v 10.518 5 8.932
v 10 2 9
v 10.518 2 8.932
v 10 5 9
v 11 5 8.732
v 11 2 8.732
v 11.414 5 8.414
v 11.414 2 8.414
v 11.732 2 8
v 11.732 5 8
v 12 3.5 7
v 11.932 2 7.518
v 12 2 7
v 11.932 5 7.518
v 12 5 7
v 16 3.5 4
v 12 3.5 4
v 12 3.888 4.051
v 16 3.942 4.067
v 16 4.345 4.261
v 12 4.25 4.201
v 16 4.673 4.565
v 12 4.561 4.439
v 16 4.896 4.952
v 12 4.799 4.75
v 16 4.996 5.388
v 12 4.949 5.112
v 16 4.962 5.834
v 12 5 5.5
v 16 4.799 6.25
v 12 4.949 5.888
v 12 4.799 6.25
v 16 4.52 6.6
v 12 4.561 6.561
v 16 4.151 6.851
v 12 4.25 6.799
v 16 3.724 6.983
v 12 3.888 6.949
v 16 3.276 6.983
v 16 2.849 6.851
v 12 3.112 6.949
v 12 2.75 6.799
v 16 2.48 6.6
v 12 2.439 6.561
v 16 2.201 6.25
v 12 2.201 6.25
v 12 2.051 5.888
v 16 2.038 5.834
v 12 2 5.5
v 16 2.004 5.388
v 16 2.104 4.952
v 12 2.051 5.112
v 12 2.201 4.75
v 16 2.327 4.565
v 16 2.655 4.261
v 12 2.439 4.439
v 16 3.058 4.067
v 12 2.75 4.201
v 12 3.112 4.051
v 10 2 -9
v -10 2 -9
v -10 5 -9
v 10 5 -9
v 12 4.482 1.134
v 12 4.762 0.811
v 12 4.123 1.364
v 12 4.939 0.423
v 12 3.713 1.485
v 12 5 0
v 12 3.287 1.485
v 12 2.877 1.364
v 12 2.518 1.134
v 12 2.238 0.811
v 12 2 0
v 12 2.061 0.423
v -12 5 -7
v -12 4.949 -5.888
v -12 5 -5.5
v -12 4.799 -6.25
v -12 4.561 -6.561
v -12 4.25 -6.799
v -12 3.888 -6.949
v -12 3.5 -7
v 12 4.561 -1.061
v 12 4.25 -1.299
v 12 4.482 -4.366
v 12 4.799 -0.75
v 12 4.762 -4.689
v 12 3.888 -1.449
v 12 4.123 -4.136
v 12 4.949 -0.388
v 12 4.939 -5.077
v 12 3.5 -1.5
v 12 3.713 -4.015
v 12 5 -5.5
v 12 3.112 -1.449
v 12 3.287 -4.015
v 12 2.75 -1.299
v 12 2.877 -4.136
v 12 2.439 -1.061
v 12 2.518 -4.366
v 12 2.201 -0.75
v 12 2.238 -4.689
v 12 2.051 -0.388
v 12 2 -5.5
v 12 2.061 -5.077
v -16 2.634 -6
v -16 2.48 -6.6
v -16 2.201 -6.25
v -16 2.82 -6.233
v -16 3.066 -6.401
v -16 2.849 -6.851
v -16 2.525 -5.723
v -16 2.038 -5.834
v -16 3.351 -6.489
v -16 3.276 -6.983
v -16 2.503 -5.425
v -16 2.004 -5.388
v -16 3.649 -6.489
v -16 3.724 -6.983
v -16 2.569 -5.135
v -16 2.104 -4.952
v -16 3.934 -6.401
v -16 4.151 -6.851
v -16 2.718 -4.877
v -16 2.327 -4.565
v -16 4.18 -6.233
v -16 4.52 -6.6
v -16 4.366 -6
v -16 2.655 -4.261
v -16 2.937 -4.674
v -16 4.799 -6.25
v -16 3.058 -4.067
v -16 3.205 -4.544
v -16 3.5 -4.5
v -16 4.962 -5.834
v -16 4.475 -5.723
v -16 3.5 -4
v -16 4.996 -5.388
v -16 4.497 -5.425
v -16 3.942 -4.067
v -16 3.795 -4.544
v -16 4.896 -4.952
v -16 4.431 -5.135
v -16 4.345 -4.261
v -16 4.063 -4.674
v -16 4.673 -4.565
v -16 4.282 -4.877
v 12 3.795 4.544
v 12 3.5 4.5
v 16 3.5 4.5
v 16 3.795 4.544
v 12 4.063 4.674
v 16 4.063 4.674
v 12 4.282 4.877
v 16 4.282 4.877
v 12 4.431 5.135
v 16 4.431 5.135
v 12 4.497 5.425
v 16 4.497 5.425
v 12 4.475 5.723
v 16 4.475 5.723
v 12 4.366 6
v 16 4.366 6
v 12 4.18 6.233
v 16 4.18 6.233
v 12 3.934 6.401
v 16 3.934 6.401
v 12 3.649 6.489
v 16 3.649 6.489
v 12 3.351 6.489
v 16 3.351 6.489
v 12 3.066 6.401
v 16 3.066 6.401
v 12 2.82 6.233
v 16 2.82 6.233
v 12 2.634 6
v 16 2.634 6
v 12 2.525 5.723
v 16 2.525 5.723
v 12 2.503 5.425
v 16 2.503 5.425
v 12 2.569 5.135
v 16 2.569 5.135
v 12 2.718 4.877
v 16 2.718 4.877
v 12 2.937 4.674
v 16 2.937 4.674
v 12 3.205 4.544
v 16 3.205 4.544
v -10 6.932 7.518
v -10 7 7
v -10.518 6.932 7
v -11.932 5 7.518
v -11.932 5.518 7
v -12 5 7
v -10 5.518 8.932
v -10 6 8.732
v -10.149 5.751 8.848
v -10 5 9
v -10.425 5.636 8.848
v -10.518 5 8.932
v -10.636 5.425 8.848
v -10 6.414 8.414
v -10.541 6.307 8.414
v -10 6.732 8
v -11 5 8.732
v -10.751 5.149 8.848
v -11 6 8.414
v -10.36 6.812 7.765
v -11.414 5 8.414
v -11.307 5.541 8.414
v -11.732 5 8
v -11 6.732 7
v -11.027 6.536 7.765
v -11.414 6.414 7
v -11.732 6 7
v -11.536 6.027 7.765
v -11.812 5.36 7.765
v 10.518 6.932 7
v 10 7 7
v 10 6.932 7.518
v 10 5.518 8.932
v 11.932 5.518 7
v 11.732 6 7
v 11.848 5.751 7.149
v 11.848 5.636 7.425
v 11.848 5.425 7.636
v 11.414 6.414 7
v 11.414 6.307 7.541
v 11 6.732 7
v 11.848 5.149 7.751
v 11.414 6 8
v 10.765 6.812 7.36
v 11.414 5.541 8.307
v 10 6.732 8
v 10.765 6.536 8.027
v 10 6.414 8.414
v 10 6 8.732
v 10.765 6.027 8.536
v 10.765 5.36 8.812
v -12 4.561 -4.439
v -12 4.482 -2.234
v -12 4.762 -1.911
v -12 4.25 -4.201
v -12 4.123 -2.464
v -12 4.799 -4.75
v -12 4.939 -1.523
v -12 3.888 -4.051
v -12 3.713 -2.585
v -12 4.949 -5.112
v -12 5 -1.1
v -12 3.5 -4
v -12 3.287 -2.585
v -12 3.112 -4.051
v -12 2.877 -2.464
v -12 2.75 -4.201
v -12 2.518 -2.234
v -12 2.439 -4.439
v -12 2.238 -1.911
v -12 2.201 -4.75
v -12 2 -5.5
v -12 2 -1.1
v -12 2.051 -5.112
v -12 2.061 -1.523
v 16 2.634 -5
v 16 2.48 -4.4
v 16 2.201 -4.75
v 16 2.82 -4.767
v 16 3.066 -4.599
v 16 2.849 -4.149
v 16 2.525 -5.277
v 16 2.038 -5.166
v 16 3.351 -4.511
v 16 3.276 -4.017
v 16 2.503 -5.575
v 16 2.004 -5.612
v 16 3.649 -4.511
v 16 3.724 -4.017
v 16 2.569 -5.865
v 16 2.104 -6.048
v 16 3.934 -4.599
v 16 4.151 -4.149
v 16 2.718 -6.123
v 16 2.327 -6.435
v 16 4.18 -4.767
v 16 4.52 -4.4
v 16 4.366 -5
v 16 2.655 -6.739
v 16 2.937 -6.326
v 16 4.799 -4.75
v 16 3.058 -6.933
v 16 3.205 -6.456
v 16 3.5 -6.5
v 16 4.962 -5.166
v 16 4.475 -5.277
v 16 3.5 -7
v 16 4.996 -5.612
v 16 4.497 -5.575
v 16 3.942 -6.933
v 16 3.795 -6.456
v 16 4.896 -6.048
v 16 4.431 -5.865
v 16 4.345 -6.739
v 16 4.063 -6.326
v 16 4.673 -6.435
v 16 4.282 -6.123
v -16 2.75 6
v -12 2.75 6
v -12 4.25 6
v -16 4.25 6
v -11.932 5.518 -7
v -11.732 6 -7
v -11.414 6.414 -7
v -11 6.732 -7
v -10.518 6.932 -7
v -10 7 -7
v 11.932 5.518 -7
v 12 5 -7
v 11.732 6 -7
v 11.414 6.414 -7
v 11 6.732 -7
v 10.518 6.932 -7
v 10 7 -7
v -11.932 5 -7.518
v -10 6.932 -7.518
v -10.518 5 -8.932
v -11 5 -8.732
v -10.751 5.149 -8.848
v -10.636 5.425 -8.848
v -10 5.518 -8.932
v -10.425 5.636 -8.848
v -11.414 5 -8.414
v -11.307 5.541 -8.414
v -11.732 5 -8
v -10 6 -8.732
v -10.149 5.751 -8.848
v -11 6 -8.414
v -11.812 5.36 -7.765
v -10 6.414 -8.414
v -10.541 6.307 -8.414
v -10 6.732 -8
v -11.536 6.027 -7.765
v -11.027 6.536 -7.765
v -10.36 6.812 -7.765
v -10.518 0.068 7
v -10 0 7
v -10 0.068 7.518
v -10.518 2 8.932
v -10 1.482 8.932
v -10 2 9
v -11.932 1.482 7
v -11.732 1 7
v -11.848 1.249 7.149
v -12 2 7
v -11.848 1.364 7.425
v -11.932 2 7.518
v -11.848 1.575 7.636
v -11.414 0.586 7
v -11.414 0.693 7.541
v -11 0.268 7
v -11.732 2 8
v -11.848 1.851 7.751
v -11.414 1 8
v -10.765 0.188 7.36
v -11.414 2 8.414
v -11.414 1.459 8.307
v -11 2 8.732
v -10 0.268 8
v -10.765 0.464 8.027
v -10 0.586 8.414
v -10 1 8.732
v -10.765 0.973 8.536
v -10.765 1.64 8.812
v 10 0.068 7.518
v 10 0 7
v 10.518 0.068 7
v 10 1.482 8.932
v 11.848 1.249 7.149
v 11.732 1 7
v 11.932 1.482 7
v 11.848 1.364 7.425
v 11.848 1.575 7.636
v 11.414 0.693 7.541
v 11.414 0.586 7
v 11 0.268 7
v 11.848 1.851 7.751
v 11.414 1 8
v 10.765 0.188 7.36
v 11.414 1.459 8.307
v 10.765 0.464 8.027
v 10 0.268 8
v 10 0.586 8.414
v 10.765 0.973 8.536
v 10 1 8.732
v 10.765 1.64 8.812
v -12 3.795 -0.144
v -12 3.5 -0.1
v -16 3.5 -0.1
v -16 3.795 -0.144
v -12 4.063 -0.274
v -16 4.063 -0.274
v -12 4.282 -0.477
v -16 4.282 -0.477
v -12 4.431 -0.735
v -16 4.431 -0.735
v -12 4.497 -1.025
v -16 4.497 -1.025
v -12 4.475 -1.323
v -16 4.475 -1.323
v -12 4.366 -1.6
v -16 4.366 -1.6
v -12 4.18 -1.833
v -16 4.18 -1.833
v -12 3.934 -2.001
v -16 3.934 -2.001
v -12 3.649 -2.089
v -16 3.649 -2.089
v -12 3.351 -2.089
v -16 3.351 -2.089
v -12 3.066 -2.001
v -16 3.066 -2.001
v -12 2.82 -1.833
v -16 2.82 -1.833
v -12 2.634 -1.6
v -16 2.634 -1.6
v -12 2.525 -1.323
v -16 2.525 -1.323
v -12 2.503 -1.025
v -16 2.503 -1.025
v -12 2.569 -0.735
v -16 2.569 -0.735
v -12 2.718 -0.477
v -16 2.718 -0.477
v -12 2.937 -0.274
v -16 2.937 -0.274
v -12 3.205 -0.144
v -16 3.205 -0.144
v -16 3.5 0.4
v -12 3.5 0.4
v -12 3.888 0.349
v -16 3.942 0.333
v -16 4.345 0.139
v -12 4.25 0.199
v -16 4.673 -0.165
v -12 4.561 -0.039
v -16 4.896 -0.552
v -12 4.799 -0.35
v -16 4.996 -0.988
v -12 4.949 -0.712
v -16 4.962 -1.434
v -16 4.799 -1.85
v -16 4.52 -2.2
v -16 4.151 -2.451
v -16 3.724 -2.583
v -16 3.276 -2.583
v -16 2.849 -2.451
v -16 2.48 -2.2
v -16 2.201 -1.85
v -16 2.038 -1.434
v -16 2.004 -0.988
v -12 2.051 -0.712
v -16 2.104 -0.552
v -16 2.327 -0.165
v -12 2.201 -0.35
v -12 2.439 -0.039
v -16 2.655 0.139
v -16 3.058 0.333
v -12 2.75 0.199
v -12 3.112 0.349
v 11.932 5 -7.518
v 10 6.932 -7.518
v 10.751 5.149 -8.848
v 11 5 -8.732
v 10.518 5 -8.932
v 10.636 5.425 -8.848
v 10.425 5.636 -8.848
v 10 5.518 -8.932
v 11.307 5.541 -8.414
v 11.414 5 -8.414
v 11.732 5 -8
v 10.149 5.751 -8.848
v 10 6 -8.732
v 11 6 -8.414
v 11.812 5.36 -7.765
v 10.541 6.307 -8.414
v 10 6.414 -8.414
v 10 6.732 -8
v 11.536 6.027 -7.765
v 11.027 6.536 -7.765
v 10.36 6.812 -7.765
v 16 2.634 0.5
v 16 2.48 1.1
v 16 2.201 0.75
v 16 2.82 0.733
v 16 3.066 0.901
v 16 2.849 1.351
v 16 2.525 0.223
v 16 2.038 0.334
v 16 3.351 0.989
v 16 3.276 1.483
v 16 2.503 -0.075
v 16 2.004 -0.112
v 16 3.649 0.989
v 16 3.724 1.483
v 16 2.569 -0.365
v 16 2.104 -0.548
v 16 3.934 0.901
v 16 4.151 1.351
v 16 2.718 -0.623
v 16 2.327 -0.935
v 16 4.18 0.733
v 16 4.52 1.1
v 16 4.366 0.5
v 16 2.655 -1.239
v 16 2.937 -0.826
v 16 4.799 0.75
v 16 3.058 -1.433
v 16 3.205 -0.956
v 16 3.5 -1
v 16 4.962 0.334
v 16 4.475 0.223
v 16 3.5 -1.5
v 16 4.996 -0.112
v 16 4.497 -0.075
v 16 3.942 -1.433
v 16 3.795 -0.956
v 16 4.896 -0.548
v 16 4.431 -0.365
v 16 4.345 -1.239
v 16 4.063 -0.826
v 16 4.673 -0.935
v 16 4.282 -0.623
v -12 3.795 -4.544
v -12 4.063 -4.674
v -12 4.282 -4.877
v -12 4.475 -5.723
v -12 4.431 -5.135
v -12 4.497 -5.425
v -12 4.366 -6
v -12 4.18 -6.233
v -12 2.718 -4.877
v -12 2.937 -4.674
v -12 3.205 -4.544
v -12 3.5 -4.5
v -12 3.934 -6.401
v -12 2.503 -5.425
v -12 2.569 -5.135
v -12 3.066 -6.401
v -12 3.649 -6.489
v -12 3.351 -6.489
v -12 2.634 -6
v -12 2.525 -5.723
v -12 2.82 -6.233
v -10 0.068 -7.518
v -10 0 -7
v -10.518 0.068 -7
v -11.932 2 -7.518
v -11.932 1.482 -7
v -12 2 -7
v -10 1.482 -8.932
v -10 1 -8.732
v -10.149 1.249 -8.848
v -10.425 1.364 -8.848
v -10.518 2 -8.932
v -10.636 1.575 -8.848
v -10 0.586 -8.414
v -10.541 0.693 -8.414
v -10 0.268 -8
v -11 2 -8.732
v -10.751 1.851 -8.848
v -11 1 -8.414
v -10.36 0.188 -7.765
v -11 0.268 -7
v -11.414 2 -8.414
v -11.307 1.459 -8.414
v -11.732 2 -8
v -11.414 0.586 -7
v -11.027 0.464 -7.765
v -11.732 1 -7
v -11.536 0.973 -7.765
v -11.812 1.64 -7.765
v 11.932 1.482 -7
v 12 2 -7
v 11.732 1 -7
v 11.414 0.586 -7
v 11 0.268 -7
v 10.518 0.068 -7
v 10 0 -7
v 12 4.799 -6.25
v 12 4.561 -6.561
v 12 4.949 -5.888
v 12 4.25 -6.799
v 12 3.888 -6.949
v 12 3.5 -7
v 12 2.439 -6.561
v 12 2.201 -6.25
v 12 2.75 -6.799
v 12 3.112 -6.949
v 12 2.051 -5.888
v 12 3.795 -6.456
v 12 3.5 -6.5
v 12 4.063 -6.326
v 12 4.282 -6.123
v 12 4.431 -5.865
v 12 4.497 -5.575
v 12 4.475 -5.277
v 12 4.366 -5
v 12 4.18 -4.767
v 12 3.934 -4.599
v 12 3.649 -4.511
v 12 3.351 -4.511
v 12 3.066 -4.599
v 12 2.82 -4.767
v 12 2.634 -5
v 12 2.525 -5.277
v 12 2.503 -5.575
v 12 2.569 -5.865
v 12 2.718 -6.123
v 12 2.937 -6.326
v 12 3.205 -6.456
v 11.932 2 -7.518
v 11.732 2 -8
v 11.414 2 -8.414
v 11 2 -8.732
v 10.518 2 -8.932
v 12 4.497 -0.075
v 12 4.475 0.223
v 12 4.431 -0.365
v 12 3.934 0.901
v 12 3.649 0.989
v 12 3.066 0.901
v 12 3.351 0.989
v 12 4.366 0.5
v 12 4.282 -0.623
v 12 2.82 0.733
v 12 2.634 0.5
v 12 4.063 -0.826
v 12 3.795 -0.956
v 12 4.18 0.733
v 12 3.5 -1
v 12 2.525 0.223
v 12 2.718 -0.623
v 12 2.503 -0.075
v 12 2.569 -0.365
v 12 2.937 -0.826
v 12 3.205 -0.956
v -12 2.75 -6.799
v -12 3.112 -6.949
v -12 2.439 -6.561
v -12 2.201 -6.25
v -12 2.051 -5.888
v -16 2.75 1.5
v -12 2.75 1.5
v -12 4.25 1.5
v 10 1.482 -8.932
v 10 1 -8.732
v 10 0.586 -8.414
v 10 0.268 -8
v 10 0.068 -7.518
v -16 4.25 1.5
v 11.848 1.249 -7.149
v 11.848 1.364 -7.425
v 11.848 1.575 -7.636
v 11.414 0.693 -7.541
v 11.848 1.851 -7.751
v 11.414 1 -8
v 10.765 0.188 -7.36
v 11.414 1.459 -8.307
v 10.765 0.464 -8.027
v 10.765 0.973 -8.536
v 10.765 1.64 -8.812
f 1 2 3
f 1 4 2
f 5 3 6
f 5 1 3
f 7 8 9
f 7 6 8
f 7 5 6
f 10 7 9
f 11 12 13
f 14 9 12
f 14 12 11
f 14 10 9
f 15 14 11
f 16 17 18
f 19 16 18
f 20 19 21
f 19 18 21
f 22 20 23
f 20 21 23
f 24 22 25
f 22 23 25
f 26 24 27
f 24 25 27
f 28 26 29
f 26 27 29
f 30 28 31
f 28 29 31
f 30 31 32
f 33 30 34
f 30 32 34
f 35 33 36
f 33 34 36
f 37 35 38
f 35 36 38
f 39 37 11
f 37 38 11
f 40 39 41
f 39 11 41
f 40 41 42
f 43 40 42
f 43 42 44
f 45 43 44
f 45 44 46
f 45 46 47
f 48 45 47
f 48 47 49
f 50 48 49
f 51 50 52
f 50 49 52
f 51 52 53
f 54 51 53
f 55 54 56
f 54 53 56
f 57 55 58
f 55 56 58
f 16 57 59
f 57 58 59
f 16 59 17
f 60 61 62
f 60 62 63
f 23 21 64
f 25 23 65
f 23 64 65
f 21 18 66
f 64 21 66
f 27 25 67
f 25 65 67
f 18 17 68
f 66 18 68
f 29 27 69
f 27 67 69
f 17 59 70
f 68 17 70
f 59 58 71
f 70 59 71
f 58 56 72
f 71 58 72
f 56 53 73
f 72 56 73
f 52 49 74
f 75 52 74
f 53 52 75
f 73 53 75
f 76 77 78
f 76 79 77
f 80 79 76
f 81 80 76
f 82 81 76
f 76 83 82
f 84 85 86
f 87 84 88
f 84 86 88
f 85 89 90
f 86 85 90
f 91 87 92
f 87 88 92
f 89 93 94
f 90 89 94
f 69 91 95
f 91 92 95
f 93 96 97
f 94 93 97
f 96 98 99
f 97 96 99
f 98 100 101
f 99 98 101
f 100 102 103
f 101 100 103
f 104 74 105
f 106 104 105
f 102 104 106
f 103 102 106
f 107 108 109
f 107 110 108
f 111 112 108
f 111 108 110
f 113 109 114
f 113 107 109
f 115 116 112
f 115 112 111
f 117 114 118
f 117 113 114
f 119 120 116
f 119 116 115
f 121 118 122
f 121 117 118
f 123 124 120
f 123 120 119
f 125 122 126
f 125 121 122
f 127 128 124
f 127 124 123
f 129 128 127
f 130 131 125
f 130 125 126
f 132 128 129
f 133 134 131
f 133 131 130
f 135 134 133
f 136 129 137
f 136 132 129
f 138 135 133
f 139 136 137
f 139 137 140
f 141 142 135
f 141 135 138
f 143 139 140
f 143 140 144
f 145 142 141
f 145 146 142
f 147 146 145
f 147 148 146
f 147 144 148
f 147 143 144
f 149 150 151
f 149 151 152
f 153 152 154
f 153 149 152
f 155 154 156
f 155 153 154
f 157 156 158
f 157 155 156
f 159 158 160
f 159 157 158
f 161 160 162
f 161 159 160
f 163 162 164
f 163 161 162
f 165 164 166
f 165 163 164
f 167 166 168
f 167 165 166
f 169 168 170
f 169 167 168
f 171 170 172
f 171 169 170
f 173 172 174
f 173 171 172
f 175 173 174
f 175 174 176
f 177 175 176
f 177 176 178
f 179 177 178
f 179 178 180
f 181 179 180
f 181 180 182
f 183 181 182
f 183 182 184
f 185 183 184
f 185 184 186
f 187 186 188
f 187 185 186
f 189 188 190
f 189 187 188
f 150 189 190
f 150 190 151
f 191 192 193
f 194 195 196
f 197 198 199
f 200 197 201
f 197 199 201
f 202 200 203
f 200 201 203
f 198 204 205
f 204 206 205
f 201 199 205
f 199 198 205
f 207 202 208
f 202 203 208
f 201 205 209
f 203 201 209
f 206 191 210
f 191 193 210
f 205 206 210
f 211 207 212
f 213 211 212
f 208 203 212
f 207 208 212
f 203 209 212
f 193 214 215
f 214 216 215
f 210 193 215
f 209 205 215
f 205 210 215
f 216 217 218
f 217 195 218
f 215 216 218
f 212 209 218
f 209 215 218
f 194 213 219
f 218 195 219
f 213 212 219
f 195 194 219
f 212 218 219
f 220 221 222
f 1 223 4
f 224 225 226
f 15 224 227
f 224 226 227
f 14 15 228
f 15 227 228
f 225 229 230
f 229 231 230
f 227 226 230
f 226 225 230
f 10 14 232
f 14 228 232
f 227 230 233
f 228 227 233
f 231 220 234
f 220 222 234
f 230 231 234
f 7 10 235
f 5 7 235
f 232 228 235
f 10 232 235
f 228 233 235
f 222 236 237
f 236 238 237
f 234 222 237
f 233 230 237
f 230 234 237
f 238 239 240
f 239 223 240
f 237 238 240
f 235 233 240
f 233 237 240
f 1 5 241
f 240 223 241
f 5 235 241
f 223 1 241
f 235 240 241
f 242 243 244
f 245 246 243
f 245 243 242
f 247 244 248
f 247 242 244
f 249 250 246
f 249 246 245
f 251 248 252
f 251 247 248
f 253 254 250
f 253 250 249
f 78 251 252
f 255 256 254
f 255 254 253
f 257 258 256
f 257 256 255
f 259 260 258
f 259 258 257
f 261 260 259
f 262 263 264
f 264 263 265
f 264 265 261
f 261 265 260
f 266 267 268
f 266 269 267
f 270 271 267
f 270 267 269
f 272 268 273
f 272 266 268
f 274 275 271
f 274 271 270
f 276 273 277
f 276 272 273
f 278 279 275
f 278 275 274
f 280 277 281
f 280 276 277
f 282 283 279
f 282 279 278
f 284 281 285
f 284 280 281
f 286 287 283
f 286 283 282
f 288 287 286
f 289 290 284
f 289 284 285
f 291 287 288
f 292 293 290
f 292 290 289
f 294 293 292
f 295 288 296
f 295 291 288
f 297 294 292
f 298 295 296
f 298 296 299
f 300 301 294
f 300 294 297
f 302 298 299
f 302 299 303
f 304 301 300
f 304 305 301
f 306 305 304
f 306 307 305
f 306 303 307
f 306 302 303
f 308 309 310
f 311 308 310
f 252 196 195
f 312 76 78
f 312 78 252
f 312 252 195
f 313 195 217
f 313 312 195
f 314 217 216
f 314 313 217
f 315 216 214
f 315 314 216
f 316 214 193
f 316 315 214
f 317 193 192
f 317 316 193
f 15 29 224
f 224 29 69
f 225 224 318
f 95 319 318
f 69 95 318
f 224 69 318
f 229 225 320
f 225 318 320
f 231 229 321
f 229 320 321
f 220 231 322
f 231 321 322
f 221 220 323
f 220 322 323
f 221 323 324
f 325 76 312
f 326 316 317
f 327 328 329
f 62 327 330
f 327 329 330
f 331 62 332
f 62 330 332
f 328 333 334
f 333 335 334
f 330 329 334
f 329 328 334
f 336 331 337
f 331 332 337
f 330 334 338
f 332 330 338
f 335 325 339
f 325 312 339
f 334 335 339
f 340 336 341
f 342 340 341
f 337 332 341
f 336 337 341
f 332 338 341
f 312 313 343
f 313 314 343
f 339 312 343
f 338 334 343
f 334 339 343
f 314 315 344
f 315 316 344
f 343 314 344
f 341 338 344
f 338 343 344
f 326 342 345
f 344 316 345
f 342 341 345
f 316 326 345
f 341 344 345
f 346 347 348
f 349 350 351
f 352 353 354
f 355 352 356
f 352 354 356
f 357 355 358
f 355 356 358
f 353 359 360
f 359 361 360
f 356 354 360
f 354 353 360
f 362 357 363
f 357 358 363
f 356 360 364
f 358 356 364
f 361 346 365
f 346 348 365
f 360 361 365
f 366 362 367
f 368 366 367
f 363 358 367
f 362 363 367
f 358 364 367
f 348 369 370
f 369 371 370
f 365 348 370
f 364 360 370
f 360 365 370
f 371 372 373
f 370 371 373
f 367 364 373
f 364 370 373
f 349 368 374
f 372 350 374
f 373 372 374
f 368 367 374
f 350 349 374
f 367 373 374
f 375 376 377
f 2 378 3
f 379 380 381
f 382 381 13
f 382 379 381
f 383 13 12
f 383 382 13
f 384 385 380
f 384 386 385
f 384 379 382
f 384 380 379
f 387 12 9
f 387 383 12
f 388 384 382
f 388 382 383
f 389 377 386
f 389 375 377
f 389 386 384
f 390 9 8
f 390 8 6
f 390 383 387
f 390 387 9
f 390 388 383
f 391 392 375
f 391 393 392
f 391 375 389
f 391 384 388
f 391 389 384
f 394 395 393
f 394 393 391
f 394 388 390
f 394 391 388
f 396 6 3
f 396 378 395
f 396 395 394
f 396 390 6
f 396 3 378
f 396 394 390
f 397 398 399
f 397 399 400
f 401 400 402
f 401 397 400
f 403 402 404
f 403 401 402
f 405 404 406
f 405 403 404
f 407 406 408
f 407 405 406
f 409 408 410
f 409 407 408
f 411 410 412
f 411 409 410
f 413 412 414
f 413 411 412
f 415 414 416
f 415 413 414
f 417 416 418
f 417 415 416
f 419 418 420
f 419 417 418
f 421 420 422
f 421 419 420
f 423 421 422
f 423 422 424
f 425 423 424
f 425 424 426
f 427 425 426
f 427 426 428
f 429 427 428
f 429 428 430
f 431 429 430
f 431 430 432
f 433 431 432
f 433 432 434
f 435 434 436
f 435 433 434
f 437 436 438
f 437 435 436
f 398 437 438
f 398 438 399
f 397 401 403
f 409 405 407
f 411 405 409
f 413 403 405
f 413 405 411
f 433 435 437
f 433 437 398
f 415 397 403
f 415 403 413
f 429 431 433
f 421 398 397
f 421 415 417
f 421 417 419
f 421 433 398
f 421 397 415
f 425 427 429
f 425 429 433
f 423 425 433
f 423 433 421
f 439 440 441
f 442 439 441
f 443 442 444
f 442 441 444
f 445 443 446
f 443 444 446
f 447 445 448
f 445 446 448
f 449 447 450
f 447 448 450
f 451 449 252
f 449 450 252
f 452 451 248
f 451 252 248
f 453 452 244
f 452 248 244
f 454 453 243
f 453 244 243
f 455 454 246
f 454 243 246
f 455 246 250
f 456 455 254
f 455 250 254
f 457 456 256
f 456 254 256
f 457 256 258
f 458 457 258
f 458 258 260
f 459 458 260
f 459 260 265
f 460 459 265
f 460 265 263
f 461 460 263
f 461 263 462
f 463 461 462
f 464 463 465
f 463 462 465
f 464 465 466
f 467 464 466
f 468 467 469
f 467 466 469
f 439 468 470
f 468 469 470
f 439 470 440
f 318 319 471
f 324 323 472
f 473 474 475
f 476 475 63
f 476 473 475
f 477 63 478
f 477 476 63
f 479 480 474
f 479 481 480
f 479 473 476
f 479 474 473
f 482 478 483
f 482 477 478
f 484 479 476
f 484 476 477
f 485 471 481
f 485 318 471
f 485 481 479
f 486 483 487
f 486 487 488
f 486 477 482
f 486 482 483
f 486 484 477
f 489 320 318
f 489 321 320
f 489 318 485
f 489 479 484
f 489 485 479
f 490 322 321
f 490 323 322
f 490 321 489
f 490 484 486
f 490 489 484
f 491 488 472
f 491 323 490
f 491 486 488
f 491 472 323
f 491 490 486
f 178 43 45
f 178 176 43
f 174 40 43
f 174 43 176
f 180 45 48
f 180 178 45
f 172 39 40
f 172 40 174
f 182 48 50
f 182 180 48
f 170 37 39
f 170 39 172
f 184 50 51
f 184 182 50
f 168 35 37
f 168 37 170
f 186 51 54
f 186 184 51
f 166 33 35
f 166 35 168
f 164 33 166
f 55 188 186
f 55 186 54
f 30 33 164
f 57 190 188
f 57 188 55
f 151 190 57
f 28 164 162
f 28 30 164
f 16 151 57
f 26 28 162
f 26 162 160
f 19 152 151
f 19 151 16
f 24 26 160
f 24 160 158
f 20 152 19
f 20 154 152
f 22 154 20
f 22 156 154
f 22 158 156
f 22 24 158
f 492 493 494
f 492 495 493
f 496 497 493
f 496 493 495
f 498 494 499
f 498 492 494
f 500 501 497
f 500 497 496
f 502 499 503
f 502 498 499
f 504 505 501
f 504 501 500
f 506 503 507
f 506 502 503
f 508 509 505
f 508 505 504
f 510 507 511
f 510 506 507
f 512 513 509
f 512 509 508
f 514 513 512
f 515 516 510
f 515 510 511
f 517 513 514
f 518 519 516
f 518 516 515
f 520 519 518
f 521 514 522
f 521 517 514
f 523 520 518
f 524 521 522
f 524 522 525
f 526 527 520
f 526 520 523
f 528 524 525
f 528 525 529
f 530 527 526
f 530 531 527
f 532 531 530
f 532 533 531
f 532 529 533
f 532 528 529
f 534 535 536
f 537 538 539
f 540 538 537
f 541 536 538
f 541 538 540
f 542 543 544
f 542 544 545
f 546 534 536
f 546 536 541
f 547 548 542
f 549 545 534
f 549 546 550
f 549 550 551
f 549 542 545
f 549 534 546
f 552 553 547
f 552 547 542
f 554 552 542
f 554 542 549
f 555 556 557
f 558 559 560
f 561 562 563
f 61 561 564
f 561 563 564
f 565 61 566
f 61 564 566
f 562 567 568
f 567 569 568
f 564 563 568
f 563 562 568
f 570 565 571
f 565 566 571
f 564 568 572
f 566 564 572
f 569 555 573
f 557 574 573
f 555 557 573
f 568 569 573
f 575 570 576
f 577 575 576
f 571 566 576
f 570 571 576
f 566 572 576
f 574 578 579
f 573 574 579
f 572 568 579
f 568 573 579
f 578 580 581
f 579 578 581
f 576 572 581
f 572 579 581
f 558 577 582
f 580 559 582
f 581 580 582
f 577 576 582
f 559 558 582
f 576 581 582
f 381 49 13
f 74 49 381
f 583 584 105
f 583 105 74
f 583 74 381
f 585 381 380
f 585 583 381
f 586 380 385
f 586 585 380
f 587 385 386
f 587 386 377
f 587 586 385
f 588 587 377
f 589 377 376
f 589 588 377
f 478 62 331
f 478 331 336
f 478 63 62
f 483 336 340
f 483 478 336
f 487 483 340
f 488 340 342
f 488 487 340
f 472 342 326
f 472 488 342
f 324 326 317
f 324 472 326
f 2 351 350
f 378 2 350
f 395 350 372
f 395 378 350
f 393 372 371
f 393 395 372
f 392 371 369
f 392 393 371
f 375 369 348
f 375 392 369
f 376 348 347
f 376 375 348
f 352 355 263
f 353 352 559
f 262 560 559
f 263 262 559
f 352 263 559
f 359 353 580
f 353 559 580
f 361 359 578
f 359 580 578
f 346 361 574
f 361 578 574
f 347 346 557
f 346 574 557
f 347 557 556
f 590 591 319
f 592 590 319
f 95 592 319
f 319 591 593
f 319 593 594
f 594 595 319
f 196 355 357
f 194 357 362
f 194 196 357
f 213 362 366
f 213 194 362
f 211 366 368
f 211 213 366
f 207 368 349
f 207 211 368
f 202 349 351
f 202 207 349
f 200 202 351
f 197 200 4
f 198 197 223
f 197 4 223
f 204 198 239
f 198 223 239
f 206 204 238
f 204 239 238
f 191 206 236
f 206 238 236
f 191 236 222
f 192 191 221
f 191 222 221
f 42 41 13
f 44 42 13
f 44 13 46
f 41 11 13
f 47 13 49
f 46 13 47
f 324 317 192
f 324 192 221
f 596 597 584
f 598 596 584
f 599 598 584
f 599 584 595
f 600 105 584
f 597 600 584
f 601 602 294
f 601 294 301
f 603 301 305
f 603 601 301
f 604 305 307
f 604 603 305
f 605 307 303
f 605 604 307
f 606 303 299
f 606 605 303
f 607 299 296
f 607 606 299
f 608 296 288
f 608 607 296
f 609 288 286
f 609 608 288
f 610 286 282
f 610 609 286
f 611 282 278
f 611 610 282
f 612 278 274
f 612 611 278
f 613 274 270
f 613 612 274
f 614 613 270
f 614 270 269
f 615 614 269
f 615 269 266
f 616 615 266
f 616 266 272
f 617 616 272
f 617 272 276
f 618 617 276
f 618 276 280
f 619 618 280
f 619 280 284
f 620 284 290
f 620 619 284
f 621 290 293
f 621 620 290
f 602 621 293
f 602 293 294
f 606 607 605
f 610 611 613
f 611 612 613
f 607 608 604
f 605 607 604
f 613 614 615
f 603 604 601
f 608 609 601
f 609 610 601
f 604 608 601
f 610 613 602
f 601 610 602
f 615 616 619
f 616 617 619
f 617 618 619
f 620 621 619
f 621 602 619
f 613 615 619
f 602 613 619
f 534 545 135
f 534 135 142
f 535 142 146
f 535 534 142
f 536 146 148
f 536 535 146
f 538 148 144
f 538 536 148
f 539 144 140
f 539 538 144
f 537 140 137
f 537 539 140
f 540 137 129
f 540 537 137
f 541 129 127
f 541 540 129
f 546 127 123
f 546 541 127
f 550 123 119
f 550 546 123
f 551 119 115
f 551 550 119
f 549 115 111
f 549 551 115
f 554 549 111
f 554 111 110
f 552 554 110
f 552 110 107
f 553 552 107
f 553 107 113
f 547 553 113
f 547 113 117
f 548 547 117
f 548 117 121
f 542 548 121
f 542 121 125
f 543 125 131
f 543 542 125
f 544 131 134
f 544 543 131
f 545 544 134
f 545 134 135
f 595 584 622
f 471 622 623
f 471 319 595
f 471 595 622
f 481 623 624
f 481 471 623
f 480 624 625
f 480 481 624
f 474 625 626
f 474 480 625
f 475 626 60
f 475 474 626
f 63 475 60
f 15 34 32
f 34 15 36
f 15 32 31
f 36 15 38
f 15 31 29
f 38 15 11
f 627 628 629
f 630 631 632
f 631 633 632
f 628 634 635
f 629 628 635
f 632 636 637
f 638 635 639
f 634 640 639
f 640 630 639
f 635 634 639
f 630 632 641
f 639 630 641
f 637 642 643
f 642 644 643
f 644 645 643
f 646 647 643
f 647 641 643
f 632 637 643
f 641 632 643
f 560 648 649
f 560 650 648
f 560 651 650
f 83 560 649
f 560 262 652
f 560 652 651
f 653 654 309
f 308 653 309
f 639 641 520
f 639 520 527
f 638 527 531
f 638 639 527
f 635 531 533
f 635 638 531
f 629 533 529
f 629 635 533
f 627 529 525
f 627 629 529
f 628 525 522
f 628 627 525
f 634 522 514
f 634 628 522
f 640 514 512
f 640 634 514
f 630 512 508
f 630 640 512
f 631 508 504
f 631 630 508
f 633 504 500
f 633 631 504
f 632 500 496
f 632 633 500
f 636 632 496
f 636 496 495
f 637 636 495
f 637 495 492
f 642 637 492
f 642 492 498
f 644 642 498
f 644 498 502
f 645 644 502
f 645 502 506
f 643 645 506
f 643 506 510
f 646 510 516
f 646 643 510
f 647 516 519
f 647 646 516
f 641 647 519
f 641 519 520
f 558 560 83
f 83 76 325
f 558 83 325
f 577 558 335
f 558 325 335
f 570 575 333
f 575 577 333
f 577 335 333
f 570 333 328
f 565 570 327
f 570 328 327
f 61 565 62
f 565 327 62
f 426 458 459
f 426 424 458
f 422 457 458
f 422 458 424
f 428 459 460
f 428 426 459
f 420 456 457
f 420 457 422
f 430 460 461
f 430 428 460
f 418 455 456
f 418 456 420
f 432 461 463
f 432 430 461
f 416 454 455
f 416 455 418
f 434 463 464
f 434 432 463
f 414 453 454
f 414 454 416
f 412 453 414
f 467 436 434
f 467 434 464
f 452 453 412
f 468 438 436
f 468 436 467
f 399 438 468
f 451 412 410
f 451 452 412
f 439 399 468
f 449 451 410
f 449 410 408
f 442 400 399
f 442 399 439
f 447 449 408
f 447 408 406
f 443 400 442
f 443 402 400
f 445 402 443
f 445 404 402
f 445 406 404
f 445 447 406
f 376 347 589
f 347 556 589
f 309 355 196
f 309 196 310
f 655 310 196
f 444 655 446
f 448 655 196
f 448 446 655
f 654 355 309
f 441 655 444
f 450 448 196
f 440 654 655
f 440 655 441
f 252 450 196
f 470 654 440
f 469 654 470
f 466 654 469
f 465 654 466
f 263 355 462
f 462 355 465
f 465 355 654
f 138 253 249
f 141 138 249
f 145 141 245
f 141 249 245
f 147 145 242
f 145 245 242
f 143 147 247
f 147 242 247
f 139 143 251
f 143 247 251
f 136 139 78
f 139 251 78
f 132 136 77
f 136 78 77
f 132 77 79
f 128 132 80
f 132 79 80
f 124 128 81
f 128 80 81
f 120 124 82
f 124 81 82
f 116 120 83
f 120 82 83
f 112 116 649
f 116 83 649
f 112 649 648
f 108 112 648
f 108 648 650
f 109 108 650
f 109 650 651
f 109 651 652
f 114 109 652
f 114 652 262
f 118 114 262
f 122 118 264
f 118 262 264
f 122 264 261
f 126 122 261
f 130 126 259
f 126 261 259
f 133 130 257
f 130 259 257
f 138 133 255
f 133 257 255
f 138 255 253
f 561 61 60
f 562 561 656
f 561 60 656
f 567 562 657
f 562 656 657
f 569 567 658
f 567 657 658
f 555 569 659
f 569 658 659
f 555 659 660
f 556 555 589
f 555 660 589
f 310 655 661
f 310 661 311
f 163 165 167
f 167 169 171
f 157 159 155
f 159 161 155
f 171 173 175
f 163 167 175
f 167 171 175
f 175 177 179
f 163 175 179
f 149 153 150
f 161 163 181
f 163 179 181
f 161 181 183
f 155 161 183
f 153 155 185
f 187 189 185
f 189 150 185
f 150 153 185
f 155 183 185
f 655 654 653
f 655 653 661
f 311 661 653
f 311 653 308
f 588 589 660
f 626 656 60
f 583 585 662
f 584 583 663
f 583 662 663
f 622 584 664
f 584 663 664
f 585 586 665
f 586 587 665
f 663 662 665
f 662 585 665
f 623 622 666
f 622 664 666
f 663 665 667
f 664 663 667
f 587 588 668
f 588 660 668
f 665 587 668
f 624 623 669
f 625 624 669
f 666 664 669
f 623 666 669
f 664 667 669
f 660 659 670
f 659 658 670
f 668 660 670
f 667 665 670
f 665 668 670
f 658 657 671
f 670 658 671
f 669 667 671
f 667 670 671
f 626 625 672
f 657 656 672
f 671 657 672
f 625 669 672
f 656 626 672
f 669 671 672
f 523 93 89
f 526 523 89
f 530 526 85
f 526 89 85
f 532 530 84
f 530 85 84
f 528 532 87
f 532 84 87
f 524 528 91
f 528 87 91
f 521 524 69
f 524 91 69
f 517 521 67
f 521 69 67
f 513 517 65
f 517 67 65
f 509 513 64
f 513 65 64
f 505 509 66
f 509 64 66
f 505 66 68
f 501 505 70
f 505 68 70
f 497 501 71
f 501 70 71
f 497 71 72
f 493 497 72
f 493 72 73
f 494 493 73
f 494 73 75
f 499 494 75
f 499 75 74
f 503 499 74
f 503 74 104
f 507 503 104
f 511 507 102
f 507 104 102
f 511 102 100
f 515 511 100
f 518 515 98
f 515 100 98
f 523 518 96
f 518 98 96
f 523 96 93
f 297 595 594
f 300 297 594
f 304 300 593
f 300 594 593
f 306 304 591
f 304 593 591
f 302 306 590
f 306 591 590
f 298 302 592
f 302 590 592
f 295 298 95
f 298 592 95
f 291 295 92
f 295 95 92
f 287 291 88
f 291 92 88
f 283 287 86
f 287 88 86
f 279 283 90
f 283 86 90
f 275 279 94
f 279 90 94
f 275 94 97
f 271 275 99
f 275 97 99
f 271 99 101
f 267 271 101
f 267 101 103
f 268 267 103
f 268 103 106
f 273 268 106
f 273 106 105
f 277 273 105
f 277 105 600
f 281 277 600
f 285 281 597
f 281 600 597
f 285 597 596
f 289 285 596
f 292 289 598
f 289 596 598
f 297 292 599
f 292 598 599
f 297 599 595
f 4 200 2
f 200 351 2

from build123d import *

# Parameters (mm, degrees)
SKETCH1_W           = 24
SKETCH1_H           = 18
BOSS_EXTRUDE1_DEPTH = 7
FILLET2_R           = 2
SKETCH2_R           = 1.5
SKETCH2_R_2         = 1
BOSS_EXTRUDE2_DEPTH = 4
SKETCH3_R           = 1.5
SKETCH3_R_2         = 1
SKETCH3_W           = 4.5
SKETCH3_H           = 1.5
BOSS_EXTRUDE3_DEPTH = 4


with BuildPart() as part:
    # Sketch1 → Boss-Extrude1 (new body)
    with BuildSketch(Plane(origin=(0, 0, 0), x_dir=(1, 0, 0), z_dir=(0, 1, 0))):
        Rectangle(SKETCH1_W, SKETCH1_H)
    extrude(amount=BOSS_EXTRUDE1_DEPTH)

    # Fillet2
    fillet2_edges = [part.edges().sort_by_distance(p)[0] for p in [
        (-12, 7, 0),
        (0, 7, 9),
        (12, 7, 0),
        (0, 0, 9),
        (-12, 0, 0),
        (0, 0, -9),
        (12, 0, 0),
        (12, 3.5, 9),
        (-12, 3.5, 9),
        (-12, 3.5, -9),
        (12, 3.5, -9),
        (0, 7, -9),
    ]]
    fillet(fillet2_edges, radius=FILLET2_R)

    # Sketch2 → Boss-Extrude2 (add)
    with BuildSketch(Plane(origin=(12, 0, 0), x_dir=(0, 0, -1), z_dir=(1, 0, 0))):
        with Locations((-5.5, 3.5)):
            Circle(SKETCH2_R)
        with Locations((-5.5, 3.5)):
            Circle(SKETCH2_R_2, mode=Mode.SUBTRACT)
        with Locations((0, 3.5)):
            Circle(SKETCH2_R)
        with Locations((0, 3.5)):
            Circle(SKETCH2_R_2, mode=Mode.SUBTRACT)
        with Locations((5.5, 3.5)):
            Circle(SKETCH2_R)
        with Locations((5.5, 3.5)):
            Circle(SKETCH2_R_2, mode=Mode.SUBTRACT)
    extrude(amount=BOSS_EXTRUDE2_DEPTH)

    # Sketch3 → Boss-Extrude3 (add)
    with BuildSketch(Plane.ZY.offset(12)):
        with Locations((-5.5, 3.5)):
            Circle(SKETCH3_R)
        with Locations((-5.5, 3.5)):
            Circle(SKETCH3_R_2, mode=Mode.SUBTRACT)
        with Locations((-1.1, 3.5)):
            Circle(SKETCH3_R)
        with Locations((-1.1, 3.5)):
            Circle(SKETCH3_R_2, mode=Mode.SUBTRACT)
        with Locations((3.75, 3.5)):
            Rectangle(SKETCH3_W, SKETCH3_H)
    extrude(amount=BOSS_EXTRUDE3_DEPTH)


solid = part.part
